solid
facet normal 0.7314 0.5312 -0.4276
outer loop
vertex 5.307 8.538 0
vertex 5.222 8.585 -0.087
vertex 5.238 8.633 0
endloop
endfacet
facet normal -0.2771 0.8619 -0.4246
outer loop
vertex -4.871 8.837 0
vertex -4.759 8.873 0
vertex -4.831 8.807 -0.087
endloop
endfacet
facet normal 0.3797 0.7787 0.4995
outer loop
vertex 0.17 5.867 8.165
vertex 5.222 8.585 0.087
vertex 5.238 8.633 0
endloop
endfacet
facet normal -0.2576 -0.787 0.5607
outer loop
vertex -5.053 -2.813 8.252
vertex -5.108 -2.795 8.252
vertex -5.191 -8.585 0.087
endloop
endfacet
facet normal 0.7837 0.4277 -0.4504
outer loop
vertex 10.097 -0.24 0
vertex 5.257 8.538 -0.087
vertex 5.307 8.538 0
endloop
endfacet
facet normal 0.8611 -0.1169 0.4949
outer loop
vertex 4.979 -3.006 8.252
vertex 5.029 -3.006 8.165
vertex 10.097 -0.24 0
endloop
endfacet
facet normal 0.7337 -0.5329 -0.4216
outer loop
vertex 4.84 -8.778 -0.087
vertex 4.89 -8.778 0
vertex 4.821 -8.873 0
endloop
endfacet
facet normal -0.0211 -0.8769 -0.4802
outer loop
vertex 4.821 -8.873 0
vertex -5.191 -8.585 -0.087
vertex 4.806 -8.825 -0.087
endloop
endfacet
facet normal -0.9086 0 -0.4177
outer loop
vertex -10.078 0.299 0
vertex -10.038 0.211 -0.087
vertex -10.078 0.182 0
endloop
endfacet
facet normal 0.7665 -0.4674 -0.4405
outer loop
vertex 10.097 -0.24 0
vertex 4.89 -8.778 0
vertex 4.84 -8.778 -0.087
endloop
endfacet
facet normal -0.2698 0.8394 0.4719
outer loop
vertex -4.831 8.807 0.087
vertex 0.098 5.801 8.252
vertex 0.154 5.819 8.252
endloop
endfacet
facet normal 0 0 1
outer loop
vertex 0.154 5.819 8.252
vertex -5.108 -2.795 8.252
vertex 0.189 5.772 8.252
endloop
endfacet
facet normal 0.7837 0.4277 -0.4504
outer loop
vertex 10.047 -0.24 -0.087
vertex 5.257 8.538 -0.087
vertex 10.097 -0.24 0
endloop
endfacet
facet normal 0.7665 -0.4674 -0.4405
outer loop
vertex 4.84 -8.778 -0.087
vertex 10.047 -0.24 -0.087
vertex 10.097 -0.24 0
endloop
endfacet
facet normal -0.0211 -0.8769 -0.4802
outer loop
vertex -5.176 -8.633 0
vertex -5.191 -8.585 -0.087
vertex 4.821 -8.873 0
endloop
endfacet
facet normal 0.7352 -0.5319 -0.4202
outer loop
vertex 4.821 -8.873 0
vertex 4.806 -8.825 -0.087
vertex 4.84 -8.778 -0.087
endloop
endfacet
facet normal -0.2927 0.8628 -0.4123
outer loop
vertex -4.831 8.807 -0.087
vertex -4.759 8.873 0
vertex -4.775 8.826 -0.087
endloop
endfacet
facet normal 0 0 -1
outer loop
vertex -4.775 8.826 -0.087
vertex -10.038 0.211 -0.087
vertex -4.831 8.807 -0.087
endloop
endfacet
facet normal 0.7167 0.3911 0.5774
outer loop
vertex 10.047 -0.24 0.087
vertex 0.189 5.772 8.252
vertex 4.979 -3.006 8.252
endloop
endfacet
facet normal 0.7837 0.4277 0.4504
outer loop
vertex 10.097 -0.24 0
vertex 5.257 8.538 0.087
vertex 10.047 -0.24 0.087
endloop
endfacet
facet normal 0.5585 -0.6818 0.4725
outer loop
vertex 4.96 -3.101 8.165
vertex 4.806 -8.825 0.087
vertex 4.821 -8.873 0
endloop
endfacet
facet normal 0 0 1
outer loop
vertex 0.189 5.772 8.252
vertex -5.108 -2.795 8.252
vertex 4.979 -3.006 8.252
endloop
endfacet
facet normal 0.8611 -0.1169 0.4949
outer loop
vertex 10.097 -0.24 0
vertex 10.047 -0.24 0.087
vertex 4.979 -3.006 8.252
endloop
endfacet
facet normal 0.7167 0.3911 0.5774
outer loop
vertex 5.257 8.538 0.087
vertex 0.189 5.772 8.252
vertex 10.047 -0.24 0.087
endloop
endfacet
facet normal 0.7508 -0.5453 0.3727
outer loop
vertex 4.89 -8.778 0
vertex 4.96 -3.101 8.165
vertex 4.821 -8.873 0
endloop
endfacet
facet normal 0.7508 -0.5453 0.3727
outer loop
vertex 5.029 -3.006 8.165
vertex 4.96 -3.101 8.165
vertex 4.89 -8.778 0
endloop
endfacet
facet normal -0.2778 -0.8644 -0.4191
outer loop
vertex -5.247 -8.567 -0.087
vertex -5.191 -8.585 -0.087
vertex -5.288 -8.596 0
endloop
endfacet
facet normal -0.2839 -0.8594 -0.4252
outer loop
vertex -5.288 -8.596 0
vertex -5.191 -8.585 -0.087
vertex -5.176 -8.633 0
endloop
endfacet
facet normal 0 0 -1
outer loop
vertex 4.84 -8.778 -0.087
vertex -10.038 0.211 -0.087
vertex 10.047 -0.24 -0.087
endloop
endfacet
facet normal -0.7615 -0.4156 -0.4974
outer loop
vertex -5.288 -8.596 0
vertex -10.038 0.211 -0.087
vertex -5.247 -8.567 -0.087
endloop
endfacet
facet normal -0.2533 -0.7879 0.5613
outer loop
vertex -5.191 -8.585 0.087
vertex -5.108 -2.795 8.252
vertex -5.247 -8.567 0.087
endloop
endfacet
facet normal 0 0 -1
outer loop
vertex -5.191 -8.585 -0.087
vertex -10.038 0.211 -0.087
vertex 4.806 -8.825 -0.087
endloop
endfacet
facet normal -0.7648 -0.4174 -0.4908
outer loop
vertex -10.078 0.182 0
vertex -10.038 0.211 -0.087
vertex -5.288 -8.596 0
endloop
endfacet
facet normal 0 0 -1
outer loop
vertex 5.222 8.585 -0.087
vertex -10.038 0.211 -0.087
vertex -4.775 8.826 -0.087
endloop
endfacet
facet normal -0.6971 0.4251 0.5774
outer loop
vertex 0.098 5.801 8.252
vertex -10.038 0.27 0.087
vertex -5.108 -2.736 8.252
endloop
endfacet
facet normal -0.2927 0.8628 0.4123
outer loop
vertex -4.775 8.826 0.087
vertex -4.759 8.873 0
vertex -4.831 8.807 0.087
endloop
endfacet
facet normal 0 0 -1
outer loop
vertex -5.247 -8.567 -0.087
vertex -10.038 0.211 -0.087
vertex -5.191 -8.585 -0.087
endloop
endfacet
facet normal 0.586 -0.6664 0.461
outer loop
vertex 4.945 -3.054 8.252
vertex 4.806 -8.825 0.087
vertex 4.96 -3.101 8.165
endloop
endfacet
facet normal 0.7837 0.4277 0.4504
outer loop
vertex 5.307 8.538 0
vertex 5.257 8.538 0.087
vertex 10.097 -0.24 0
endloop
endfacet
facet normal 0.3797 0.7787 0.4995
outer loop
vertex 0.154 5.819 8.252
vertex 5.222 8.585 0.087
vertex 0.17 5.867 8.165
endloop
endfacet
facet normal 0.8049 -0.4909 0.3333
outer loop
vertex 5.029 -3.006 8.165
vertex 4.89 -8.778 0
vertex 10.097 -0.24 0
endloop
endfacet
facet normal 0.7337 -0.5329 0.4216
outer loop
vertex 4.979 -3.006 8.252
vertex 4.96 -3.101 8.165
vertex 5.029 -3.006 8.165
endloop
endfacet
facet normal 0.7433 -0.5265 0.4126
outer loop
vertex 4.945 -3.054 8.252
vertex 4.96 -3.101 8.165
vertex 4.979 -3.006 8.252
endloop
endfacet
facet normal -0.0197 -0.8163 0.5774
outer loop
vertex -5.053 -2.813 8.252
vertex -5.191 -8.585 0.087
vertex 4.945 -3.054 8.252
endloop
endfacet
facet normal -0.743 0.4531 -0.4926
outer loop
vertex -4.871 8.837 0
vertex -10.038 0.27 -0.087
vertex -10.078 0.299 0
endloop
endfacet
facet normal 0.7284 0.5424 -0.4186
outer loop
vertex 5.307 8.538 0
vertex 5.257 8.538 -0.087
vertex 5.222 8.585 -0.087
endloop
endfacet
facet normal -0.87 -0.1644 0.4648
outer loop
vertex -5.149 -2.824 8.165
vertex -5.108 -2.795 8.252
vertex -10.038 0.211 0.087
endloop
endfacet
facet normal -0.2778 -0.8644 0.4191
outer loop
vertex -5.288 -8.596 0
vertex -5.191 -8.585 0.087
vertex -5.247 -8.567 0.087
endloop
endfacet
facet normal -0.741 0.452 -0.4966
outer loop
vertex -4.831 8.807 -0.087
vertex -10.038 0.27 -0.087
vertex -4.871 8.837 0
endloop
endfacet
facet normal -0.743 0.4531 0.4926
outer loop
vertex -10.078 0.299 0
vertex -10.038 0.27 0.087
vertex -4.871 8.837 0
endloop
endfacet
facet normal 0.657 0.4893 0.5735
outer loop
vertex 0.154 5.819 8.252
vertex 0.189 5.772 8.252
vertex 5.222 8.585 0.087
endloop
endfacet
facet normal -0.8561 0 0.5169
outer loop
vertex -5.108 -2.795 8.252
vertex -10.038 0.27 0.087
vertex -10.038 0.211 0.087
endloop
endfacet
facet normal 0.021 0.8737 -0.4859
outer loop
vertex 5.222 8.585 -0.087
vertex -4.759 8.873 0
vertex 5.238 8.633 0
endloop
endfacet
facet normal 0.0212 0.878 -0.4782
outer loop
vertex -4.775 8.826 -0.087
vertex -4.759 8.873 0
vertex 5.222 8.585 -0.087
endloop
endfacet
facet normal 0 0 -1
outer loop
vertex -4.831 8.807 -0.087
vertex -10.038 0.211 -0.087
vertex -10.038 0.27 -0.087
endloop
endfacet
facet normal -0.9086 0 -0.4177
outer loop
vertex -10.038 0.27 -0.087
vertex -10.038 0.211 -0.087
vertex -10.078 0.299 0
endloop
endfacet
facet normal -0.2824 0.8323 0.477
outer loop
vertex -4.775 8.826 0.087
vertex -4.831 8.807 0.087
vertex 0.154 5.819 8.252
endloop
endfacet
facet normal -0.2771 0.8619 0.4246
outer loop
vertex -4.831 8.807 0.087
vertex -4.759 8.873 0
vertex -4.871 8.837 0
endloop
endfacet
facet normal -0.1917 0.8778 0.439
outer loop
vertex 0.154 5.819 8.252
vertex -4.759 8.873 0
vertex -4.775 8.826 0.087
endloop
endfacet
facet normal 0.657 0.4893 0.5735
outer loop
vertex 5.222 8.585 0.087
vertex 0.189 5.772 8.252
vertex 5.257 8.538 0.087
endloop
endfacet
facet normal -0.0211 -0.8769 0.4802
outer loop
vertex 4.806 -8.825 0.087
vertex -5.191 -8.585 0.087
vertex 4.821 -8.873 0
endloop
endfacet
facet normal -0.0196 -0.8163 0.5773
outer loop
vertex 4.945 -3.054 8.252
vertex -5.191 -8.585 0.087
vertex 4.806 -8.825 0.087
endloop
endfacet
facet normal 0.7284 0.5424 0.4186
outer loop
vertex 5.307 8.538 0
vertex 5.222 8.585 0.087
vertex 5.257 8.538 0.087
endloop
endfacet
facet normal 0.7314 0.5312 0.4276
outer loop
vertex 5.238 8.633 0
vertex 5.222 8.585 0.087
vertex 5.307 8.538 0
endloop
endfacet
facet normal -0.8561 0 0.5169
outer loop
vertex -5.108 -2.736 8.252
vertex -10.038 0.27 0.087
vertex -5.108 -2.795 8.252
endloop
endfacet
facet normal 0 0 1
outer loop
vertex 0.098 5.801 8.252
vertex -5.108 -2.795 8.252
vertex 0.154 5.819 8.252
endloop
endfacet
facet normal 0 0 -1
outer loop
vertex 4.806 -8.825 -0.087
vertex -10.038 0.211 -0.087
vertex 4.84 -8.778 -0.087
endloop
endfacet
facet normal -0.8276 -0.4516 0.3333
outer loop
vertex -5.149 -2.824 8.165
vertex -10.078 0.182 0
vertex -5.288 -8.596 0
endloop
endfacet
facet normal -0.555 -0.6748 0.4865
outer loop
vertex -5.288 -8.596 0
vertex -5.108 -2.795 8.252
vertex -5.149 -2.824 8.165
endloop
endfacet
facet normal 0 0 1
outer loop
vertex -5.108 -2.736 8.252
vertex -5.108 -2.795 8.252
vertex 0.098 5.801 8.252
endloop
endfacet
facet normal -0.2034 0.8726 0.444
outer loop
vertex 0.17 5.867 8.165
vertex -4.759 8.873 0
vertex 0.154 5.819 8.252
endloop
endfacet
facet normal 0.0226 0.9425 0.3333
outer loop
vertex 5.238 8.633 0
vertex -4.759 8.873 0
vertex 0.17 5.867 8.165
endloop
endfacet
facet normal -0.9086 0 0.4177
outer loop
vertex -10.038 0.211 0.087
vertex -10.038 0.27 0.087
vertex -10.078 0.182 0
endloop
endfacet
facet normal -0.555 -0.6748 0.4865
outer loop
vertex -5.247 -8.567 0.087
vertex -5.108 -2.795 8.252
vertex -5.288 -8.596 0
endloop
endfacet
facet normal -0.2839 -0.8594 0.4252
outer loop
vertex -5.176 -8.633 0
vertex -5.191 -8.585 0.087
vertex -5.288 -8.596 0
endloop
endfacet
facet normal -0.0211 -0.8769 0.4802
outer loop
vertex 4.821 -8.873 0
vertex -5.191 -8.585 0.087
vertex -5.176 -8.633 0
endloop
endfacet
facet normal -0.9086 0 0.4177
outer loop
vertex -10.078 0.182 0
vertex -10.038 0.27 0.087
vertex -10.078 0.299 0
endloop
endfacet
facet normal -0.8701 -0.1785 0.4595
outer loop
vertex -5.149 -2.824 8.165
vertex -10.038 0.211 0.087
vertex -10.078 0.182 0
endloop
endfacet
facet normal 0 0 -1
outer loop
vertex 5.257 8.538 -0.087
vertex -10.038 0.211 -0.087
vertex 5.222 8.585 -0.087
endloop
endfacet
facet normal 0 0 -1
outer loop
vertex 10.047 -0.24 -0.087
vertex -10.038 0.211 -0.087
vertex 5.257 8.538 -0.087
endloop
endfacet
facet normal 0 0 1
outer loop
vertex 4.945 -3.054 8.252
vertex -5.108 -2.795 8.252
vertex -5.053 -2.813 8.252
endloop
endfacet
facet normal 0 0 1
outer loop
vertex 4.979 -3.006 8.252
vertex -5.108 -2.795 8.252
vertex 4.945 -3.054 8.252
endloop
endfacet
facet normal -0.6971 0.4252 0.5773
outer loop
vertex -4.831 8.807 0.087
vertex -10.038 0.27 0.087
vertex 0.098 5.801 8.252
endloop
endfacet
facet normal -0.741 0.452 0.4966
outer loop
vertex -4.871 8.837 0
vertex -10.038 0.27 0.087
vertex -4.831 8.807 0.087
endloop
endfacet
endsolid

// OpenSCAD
// Auto-generated OpenSCAD file

    inner_points = 10*[[-0.5067955693093701, -0.2765711460282869, 0.8164965809276397], [0.47903674428989906, -0.8777932204727784, 1.4395706848802092e-12], [-0.47903813632393366, 0.8777957186404731, -1.4395706848802092e-12], [0.4929154607816119, -0.3006097881369385, 0.8164965809284891], [-0.5206742858010829, -0.8537545783641267, 5.901945598907332e-13], [0.5206728937670484, 0.8537570765318214, -5.901945598907332e-13], [0.013878020474695501, 0.577184681419687, 0.8164965809270495], [0.9997103340739647, -0.024037393024804222, 8.493389008763497e-13], [-0.9997117261079992, 0.02403989119249895, -8.493389008763497e-13]];

    outer_points = 10*[[-0.512923269542972, -0.04952440908620236, 0.8570046980419713], [0.8557409845176946, 0.04952440908620236, 0.5150288344562363], [-0.8557409845176946, -0.04952440908620236, -0.5150288344562363], [0.12336155278650156, 0.7053703515917454, 0.6980219154077046], [0.21945616218822123, -0.7053703515917454, 0.674011617090503], [-0.21945616218822123, 0.7053703515917454, -0.674011617090503], [-0.7323794317311931, 0.6558459425055431, 0.1829930809514684], [0.6362848223294735, 0.7548947606779478, -0.15898278263426666], [-0.6362848223294735, -0.7548947606779478, 0.15898278263426666]];

    // Convex hull for inner set (I)
    module inner_hull() {
        hull() {
            for (p = inner_points) {
                translate(p) sphere(r=0.1);
            }
        }
    }

    // Convex hull for outer set (O) minus inner hull (O \ I)
    module outer_minus_inner() {
        difference() {
            hull() {
                for (p = outer_points) {
                    translate(p) sphere(r=0.1);
                }
            }
            inner_hull(); // Subtract inner hull
        }
    }

    // Convex hull for outer set (O) minus all translated inner hulls
    module outer_minus_AllTranslationInner() {
        difference() {
            hull() {
                for (p = outer_points) {
                    translate(p) sphere(r=0.1);
                }
            }
            hull() {
                translate([0,0,50]) inner_hull();
                translate([0,0,-50]) inner_hull();
            }; // Subtract translated inner hulls
        }
    }

    // Difference between outer_minus_inner and outer_minus_AllTranslationInner
    module outer_minus_inner_diff() {
        difference() {
            // Outer minus inner
            difference() {
                hull() {
                    for (p = outer_points) {
                        translate(p) sphere(r=0.1);
                    }
                }
                inner_hull();
            }

            // Subtract Outer minus AllTranslationInner
            difference() {
                hull() {
                    for (p = outer_points) {
                        translate(p) sphere(r=0.1);
                    }
                }
                hull() {
                    translate([0,0,50]) inner_hull();
                    translate([0,0,-50]) inner_hull();
                };
            }
        }
    }

    // Rendering all with colors applied
    color([1, 0, 0, 0.5]) inner_hull(); // Transparent red
    
